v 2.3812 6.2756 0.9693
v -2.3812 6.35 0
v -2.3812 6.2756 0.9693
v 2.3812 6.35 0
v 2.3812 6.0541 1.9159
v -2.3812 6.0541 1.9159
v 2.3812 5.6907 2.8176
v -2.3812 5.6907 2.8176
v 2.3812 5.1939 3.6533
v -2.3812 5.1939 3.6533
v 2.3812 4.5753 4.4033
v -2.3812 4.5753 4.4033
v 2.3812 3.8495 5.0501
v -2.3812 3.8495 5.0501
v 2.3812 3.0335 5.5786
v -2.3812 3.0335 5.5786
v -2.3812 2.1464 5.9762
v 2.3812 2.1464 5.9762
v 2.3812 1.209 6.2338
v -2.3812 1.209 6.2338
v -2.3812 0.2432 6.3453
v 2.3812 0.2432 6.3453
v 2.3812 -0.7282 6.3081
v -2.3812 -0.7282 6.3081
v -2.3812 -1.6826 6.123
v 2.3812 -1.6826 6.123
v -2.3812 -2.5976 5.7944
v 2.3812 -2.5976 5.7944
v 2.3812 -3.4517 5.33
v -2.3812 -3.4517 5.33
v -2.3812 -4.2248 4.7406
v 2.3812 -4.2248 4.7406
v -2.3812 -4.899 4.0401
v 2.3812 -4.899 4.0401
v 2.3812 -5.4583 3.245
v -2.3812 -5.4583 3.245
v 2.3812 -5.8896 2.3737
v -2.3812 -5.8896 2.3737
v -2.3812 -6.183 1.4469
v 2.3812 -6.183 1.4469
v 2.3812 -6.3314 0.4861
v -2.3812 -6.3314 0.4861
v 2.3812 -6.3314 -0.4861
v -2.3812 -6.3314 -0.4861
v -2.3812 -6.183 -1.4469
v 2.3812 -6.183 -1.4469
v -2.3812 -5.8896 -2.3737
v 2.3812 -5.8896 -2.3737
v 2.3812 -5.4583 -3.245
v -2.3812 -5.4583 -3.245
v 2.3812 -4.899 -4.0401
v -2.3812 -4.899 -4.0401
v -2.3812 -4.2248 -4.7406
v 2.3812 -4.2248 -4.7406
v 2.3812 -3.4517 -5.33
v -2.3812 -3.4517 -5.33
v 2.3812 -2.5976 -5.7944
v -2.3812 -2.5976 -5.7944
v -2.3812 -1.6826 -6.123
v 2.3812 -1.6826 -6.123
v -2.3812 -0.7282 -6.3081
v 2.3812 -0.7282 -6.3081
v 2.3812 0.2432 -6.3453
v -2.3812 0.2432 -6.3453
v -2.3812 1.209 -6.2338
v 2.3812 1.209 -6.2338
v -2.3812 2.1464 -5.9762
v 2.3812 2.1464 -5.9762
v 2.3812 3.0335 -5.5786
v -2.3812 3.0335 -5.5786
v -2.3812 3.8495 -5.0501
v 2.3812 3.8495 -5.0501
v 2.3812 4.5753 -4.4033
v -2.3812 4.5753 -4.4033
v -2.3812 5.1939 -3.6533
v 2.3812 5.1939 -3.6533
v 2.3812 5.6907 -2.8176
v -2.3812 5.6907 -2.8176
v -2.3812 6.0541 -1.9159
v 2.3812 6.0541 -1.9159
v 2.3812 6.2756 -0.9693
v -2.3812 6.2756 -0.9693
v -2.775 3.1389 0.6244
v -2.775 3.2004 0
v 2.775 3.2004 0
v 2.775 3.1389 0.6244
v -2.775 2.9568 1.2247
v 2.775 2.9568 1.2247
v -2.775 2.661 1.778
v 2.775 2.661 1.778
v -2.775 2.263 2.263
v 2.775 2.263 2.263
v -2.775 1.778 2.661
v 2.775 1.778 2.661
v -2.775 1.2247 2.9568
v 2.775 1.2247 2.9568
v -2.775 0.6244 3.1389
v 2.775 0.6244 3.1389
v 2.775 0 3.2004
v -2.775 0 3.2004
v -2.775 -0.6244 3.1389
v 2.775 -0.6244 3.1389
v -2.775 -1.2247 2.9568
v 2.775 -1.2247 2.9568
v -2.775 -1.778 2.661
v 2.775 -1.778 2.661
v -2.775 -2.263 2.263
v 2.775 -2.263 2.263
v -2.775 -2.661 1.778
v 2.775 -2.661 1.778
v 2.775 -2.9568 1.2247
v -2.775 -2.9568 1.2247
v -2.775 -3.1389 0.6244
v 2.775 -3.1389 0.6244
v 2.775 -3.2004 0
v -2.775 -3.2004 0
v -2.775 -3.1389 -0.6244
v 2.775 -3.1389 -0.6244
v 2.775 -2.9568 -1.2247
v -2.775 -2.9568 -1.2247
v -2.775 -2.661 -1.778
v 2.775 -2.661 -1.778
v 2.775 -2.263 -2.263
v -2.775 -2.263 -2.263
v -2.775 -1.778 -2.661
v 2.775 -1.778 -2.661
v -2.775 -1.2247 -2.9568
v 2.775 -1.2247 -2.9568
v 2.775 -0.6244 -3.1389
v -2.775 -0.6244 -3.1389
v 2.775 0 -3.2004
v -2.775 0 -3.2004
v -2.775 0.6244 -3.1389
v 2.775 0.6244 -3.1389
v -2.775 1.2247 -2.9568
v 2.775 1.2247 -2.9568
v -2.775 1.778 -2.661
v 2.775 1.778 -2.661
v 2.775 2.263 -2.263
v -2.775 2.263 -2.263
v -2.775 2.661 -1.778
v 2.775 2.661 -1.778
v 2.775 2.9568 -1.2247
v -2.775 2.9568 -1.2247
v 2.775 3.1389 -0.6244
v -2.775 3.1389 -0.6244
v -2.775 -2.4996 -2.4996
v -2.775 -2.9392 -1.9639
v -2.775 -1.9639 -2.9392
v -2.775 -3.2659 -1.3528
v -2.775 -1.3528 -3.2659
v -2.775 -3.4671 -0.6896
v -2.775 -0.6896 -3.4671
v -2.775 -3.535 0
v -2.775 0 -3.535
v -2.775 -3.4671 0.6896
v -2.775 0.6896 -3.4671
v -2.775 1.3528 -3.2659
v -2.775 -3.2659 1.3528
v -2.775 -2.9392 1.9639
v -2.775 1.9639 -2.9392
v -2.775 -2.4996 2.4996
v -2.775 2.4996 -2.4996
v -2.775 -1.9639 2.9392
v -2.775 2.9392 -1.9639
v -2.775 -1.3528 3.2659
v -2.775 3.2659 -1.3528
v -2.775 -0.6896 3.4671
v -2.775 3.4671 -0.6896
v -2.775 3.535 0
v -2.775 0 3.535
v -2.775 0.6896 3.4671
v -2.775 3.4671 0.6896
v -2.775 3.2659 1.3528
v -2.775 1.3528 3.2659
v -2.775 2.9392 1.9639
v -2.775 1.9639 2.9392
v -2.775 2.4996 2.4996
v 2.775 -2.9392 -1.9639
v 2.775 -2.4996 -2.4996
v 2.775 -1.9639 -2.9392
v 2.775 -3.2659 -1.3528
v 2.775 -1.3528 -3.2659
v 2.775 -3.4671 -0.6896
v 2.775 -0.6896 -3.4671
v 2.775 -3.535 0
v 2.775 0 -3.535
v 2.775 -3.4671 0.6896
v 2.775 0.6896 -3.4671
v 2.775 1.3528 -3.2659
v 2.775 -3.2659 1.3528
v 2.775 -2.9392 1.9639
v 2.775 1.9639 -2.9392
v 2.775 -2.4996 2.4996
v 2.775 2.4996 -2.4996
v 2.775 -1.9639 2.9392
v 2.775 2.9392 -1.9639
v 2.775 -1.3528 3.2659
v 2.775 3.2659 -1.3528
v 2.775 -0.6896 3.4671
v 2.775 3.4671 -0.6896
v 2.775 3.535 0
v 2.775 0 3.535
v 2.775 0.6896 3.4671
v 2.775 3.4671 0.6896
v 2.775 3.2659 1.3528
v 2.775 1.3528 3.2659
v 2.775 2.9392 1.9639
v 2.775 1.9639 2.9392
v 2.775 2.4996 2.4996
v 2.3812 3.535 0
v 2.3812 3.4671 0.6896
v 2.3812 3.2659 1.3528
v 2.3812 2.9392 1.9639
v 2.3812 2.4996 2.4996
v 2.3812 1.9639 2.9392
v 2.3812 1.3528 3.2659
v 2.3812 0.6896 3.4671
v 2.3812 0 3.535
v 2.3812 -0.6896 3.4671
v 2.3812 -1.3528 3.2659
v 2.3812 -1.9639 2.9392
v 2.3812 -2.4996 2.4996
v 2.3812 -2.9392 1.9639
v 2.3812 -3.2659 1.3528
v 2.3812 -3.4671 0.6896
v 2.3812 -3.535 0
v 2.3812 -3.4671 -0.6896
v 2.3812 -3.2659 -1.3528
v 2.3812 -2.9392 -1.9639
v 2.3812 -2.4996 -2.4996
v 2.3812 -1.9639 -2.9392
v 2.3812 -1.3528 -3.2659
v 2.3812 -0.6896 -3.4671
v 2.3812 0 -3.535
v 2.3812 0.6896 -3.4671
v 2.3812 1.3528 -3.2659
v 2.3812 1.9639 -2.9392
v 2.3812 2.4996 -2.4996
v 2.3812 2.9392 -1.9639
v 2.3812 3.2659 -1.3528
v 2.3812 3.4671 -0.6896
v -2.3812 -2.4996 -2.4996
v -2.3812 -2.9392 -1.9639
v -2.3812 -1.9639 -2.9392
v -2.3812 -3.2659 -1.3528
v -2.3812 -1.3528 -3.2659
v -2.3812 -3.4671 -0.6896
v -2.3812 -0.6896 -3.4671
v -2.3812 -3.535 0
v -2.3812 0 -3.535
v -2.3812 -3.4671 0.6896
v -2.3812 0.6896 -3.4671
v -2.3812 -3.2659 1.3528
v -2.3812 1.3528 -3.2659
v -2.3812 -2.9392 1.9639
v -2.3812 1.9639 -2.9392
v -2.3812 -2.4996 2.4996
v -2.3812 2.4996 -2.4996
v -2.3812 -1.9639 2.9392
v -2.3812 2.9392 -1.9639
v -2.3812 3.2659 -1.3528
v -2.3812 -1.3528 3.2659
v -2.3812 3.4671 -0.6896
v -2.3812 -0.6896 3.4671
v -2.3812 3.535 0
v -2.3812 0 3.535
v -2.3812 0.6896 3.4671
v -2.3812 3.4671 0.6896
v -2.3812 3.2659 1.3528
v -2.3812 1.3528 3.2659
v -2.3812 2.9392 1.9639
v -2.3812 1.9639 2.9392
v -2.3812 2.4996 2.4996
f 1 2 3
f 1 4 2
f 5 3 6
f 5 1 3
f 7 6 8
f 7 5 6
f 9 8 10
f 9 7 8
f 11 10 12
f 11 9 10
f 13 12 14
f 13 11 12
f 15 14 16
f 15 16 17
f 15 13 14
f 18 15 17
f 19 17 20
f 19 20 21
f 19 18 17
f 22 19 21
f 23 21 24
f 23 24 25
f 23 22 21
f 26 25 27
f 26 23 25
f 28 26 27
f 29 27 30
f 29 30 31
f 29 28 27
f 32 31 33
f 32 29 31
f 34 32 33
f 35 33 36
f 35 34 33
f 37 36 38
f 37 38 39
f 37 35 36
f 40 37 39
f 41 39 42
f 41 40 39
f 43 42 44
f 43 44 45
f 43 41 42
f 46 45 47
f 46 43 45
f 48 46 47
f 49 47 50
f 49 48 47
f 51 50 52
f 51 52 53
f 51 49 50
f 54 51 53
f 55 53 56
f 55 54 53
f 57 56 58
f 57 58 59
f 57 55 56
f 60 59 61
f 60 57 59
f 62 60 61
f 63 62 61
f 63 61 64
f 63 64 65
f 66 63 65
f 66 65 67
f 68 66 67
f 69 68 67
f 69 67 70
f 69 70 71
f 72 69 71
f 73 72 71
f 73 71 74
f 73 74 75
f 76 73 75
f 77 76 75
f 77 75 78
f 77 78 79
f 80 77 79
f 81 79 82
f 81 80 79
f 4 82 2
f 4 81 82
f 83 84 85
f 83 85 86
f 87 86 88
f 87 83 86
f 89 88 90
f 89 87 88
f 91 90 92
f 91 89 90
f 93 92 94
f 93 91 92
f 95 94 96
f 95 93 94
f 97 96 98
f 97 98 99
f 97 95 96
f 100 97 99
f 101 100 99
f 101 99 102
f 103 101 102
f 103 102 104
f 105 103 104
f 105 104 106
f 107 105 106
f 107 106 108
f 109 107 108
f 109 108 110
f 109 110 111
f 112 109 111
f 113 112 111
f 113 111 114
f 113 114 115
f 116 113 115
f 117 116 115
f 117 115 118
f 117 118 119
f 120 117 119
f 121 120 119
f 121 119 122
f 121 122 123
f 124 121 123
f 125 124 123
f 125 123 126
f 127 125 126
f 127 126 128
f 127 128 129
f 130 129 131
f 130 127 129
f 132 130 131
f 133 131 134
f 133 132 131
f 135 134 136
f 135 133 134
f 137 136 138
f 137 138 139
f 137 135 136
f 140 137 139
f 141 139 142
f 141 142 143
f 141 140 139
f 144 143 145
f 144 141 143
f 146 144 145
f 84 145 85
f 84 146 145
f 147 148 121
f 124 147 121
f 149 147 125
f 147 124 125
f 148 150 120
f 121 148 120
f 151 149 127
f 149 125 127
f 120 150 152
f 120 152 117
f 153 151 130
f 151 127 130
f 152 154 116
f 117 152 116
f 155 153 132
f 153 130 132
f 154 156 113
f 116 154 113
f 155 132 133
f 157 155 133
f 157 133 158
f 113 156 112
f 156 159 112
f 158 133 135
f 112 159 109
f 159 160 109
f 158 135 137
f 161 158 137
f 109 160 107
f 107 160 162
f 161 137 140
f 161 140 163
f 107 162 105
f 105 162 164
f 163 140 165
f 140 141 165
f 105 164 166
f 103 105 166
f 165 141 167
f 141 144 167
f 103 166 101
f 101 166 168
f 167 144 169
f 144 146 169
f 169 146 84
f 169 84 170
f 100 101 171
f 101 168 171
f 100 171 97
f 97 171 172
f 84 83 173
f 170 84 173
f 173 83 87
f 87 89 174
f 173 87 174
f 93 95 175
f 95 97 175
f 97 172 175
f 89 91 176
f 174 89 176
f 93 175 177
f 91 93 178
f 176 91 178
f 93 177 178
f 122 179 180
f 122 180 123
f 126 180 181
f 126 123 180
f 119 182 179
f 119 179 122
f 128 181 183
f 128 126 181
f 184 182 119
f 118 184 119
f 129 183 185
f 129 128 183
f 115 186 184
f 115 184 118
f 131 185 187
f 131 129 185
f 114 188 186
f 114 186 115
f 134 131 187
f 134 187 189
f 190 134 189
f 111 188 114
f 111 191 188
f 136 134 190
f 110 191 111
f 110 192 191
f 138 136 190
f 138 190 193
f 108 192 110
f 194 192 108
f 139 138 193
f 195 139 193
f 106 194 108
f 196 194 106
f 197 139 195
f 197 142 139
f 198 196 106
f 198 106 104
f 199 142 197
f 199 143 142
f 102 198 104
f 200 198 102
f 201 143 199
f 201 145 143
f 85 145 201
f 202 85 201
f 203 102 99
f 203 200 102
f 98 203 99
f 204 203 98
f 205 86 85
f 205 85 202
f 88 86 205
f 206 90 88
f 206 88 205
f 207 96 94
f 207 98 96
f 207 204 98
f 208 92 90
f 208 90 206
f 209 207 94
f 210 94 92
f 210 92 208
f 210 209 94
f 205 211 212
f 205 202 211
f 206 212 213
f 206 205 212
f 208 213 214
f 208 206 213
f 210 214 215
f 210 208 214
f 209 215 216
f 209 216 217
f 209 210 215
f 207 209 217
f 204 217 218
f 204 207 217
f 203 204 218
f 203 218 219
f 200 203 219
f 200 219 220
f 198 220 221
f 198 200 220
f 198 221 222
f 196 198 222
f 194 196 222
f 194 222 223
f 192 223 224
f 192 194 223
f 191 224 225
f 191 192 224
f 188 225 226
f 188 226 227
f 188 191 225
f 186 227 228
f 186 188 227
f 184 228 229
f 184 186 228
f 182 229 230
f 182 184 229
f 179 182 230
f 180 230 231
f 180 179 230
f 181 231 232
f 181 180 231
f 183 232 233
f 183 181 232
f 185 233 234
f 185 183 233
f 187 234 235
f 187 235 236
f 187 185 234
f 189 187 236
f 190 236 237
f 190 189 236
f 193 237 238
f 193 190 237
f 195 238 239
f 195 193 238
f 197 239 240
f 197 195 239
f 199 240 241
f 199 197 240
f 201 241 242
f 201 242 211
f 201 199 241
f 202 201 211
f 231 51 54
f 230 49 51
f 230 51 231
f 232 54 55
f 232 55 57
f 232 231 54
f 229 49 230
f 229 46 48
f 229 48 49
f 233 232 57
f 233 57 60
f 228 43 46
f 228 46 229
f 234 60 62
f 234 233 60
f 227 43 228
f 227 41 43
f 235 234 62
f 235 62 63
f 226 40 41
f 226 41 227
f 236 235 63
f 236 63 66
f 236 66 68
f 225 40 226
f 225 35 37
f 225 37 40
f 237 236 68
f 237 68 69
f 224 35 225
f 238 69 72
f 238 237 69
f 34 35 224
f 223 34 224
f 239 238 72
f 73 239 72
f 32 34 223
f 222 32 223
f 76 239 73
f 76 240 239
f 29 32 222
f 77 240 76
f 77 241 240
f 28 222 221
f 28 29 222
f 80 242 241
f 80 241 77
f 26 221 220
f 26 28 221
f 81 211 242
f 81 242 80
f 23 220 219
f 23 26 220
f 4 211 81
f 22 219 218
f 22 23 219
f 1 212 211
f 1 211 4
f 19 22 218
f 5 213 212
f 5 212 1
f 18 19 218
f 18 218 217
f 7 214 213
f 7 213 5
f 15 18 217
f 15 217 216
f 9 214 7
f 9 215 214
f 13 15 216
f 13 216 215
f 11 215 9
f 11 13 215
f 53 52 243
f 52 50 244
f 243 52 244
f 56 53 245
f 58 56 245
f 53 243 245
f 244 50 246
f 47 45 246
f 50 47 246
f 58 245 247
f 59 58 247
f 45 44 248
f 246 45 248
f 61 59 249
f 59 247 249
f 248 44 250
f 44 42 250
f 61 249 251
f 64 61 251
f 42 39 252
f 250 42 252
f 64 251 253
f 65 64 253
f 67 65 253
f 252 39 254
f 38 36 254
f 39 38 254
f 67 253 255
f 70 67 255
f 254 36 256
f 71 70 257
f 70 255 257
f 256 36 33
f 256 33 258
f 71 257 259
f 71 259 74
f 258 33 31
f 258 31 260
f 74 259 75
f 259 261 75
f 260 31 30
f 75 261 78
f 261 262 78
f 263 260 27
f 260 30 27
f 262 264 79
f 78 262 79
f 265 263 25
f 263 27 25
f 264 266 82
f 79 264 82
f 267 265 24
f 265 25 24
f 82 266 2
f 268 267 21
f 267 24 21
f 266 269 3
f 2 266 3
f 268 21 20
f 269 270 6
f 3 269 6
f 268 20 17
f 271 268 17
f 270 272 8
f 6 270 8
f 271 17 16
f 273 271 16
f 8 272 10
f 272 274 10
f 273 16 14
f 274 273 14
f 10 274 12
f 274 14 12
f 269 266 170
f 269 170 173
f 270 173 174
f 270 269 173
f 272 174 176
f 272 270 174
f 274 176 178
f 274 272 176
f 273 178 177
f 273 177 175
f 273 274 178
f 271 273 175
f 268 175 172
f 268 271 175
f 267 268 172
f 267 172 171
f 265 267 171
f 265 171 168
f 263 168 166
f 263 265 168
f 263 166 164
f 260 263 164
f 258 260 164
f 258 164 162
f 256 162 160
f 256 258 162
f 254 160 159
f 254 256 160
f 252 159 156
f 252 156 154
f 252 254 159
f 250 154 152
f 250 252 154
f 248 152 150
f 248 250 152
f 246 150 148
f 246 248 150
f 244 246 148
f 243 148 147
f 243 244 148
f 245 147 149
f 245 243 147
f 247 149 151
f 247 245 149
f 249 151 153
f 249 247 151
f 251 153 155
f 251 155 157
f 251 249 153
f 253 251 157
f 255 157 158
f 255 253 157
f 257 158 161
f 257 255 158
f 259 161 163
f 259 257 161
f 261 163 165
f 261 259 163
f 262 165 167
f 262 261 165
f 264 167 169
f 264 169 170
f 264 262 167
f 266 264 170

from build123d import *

# Parameters (mm, degrees)
F0_R     = 6.35
F0_R_2   = 3.2004
F1_DEPTH = 2.38125
F2_R     = 3.535
F2_R_2   = 3.2004
F3_DEPTH = 2.775


# Not quite as in the source:
# - a length typed as a fraction of an inch, garbled in the dataset ("3 / 203.2 mm" for 3/8 in), is restored


with BuildPart() as f1:
    # F0 (on Right) → F1 (new body, symmetric)
    with BuildSketch(Plane.YZ):
        Circle(F0_R)
        Circle(F0_R_2, mode=Mode.SUBTRACT)
    extrude(amount=F1_DEPTH, both=True)

    # F2 (on Right) → F3 (join, symmetric)
    with BuildSketch(Plane.YZ):
        Circle(F2_R)
        Circle(F2_R_2, mode=Mode.SUBTRACT)
    extrude(amount=F3_DEPTH, both=True)


solid = f1.part
